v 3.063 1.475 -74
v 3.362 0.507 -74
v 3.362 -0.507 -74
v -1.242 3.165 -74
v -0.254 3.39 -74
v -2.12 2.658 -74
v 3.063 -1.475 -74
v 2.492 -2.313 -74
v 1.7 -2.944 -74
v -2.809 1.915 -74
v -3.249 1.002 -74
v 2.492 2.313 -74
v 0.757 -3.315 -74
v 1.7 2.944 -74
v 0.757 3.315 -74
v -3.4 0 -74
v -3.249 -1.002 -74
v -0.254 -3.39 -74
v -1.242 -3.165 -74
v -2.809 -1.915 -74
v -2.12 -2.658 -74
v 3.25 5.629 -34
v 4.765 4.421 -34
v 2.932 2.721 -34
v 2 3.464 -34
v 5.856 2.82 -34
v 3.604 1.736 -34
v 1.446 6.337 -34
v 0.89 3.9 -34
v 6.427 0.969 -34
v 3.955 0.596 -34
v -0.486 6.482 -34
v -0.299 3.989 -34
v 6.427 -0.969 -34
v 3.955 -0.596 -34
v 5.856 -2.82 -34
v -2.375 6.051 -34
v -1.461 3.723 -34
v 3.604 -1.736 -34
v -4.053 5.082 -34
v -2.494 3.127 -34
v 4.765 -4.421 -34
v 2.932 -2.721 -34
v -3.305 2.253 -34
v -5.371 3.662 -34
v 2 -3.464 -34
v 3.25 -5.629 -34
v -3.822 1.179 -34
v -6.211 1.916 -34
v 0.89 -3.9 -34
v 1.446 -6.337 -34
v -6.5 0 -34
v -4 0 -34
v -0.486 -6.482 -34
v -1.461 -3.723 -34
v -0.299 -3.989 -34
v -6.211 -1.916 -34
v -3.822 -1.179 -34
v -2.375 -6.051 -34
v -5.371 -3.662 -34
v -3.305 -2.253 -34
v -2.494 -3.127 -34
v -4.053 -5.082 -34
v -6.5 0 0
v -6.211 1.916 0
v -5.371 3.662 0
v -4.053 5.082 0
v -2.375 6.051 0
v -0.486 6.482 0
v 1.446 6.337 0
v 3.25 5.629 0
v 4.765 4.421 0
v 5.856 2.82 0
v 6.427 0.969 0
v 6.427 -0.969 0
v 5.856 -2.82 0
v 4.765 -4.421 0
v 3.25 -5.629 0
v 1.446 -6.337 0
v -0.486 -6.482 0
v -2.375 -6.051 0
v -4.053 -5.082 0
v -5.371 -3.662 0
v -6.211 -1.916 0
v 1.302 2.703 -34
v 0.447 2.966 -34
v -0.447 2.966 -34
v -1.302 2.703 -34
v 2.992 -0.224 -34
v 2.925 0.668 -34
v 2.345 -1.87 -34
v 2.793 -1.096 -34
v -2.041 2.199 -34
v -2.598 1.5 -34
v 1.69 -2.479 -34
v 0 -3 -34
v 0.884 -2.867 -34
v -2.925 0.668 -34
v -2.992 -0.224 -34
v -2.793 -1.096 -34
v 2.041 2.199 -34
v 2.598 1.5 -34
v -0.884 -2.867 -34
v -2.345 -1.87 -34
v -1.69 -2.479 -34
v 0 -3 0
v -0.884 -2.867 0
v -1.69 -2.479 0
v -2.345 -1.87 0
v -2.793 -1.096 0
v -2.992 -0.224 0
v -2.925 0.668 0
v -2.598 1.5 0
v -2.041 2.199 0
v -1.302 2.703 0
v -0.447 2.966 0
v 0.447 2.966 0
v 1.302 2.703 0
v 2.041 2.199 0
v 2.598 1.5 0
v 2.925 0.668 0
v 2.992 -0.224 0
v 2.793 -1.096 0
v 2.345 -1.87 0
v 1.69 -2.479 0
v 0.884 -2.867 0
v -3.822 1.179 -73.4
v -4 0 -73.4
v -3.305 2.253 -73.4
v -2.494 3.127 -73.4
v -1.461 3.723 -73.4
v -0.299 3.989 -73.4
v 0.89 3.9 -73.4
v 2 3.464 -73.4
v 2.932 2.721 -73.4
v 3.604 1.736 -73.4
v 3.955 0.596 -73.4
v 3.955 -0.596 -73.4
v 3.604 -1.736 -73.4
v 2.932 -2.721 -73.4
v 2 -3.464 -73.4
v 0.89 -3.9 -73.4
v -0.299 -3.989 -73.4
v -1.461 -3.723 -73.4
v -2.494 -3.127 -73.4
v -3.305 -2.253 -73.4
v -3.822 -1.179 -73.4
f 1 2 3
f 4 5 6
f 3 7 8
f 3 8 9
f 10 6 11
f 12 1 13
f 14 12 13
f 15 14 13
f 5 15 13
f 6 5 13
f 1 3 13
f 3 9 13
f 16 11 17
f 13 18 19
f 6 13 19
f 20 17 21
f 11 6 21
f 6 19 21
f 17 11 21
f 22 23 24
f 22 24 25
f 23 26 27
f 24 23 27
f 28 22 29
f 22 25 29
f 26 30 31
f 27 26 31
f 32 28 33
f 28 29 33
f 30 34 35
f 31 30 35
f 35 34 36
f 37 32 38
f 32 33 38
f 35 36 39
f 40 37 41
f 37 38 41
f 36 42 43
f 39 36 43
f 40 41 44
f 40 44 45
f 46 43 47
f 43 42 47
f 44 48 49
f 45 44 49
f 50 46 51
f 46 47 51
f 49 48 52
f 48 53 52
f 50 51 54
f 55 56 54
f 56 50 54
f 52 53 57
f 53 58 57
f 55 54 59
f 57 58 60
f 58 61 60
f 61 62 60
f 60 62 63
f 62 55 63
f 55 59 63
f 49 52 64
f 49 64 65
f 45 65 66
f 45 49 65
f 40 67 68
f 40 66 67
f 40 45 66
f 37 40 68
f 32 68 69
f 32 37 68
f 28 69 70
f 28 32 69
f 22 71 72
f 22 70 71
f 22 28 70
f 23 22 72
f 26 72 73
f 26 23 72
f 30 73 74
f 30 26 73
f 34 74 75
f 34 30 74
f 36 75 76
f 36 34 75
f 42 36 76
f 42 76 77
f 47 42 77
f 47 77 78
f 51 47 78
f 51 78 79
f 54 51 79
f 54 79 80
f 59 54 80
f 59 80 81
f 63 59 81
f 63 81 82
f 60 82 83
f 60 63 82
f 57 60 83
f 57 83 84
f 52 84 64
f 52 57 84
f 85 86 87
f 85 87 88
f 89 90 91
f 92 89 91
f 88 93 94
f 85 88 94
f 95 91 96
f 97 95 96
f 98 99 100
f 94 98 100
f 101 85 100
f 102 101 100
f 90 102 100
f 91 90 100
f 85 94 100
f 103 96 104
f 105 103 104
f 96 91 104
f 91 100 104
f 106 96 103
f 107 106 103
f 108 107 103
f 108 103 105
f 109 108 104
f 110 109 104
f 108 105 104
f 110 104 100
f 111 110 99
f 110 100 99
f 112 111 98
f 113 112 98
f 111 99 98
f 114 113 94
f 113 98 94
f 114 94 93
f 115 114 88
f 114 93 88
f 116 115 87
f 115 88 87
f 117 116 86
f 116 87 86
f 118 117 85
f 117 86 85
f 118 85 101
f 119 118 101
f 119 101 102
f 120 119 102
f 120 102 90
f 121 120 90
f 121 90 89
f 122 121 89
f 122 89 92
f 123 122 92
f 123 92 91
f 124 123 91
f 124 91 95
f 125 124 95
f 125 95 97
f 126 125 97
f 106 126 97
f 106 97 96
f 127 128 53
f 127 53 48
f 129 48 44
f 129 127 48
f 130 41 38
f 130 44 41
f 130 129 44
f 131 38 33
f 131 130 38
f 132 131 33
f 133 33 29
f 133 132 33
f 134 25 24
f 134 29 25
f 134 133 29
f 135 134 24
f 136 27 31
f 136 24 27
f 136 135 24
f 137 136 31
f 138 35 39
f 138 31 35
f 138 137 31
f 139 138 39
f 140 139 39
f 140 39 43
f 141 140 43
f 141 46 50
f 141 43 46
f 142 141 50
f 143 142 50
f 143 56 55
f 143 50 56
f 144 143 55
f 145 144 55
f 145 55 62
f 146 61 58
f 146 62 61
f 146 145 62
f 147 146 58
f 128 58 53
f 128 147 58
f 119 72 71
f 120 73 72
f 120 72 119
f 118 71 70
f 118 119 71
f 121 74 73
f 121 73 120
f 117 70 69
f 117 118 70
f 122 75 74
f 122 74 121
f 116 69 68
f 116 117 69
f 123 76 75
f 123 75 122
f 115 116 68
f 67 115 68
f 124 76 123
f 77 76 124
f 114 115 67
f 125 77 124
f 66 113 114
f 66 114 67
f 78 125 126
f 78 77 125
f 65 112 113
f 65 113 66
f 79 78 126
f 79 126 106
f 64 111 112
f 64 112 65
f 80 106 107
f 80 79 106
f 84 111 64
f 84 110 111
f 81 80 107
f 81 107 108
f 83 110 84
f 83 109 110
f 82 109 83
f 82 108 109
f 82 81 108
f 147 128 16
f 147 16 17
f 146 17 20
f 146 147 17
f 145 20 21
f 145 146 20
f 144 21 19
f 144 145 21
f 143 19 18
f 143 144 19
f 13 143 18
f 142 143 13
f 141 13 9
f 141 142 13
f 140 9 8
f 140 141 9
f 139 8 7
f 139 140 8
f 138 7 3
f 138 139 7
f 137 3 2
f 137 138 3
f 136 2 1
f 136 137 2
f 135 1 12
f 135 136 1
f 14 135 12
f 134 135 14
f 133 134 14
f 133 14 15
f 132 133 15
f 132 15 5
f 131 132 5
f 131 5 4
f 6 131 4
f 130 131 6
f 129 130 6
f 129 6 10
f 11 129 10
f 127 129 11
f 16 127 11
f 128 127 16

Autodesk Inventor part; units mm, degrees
ref_plane "YZ Plane" through (0, 0, 0) normal (1, 0, 0) x (0, 1, 0)
ref_plane "XZ Plane" through (0, 0, 0) normal (0, 1, 0) x (-1, 0, 0)
ref_plane "XY Plane" through (0, 0, 0) normal (0, 0, 1) x (1, 0, 0)
sketch "Skizze2" plane through (0, 0, 0) normal (0, 1, 0) x (-1, 0, 0)
  line L0 (0, 0) -> (6.5, 0)
  line L1 (6.5, 0) -> (6.5, -34)
  line L2 (6.5, -34) -> (4, -34)
  line L3 (4, -34) -> (4, -74)
  line L4 (4, -74) -> (0, -74)
  line L5 (0, -74) -> (0, 0)
  dimension "d3" = 13
  dimension "d4" = 8
  dimension "d5" = 34
  dimension "d6" = 40
revolve "Umdrehung1" add sketch "Skizze2" angle 360 about axis through (0, 0, -74) along (0, 0, 1)
chamfer "Fasen1" distance 0.6 angle 45 1 edges at (4, 0, -74)
sketch "Skizze3" plane through (0, 0, 0) normal (0, 0, 1) x (1, 0, 0)
  circle A0 centre (0, 0) radius 6.5 projected
  point P0 (0, 0)
hole "Bohrung1" at (0, 0, 0) direction (0, 0, -1) diameter 6 depth 34
properties part number "202 Welle" material "Aluminium 6061"
